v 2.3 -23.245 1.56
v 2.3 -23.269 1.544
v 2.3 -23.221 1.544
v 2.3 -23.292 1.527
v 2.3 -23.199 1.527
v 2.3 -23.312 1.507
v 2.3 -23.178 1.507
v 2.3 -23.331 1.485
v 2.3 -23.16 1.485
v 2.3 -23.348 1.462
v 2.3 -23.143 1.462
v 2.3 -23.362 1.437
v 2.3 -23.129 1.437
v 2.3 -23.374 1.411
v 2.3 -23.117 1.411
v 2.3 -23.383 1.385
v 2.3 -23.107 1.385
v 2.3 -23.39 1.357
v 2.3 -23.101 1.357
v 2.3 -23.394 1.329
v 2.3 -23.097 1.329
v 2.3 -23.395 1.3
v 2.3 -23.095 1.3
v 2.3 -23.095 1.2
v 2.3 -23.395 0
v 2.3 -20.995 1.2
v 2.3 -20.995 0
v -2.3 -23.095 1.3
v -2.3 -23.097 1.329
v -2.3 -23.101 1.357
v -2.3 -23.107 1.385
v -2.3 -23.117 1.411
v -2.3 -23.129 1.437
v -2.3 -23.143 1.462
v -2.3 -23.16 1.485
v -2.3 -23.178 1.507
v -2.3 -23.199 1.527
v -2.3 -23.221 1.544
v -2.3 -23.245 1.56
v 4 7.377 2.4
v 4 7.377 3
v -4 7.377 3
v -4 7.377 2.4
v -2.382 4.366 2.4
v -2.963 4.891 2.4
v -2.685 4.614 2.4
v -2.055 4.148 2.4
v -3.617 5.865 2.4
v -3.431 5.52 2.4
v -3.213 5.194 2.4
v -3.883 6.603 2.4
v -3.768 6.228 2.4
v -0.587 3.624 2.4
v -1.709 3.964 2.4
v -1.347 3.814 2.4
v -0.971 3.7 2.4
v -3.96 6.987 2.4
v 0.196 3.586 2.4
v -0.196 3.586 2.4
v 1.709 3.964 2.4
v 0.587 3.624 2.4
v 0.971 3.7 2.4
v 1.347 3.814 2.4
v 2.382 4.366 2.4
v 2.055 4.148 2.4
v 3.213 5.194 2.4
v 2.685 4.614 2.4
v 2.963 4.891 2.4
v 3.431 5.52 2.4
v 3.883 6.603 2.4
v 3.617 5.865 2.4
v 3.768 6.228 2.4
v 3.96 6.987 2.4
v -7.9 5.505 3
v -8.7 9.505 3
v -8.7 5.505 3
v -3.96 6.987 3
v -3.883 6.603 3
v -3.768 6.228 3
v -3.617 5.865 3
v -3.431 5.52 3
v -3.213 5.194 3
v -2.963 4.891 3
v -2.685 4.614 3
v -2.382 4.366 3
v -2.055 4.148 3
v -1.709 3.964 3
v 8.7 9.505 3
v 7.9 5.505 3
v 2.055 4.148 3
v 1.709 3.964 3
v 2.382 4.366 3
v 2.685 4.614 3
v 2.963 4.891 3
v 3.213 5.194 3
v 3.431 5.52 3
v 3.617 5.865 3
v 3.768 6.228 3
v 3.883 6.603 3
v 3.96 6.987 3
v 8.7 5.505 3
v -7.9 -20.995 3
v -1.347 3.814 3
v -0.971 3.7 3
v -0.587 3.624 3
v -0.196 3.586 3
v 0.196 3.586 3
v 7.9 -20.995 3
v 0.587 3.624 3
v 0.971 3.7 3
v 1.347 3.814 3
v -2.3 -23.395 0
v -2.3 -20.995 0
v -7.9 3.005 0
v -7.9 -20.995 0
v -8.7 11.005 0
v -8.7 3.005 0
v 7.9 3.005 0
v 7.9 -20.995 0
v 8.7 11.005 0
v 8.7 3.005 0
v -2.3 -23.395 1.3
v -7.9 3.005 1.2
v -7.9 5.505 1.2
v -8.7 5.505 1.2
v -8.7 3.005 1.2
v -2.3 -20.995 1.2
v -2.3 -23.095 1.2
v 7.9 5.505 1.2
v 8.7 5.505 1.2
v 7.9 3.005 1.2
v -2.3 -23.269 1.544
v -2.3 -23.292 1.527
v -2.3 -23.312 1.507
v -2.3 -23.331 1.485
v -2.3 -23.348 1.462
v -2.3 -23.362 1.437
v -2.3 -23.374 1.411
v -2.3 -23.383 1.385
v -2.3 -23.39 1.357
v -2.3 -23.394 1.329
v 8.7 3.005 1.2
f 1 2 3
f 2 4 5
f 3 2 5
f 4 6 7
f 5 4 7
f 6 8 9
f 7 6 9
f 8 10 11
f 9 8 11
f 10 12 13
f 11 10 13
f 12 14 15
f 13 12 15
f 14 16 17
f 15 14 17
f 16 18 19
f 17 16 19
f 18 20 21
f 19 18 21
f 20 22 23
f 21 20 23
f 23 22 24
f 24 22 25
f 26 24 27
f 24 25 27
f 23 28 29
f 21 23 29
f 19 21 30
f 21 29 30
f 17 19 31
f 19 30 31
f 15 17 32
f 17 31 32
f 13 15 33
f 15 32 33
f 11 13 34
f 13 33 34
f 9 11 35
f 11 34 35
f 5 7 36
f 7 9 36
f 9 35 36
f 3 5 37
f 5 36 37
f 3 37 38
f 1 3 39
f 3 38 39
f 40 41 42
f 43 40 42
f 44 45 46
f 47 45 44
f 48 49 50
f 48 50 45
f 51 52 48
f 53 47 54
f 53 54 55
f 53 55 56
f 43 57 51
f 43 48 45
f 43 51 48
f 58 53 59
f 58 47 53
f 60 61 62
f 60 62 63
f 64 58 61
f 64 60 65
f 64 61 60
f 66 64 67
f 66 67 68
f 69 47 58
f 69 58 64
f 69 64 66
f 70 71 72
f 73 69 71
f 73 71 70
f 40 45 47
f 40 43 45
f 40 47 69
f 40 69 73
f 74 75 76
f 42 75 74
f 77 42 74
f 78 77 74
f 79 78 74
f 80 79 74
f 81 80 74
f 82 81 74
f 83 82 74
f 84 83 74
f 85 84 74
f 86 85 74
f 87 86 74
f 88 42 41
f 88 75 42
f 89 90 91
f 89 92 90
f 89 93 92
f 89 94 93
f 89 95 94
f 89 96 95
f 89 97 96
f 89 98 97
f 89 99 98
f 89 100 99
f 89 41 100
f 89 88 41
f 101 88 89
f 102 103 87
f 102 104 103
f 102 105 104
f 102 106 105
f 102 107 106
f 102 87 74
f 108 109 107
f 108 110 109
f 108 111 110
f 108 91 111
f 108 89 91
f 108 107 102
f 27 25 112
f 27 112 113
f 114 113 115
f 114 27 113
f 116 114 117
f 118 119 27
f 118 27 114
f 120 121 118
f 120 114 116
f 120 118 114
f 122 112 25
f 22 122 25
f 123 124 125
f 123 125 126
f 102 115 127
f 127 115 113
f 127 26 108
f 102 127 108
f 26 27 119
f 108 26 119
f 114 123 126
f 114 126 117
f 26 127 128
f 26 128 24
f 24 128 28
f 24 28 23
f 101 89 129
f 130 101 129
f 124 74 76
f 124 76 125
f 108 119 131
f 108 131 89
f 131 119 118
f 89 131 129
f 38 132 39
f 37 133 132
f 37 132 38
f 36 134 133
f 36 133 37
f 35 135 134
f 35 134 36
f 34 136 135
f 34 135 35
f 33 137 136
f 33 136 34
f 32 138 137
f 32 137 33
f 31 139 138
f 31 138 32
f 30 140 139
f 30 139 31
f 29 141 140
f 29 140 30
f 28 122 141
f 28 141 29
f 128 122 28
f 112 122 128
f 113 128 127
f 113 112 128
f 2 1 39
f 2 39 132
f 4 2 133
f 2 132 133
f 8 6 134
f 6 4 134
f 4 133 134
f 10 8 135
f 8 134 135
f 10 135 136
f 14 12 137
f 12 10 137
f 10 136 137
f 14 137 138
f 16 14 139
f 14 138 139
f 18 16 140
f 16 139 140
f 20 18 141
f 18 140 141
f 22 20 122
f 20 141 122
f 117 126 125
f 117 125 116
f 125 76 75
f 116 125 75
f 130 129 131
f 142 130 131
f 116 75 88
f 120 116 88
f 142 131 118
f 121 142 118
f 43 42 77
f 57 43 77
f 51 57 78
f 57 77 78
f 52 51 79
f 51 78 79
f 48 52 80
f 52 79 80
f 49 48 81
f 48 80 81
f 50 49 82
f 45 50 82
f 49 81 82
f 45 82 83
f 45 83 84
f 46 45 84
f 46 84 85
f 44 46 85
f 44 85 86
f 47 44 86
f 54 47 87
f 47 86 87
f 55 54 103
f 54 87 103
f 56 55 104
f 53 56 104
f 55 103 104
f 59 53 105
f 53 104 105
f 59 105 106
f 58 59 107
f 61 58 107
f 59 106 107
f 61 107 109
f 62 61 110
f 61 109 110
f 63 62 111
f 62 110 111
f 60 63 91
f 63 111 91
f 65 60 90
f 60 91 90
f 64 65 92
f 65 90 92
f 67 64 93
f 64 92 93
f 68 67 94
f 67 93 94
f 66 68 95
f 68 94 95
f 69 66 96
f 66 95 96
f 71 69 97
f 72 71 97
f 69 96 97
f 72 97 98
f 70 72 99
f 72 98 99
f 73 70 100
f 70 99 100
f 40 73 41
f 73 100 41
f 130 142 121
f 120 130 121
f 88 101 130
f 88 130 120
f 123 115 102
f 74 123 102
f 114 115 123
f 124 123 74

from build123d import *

# Parameters (mm, degrees)
F0_W         = 15.8
F0_H         = 32
F1_DEPTH     = 3
F3_DEPTH     = 0.8
F5_W         = 4.6
F5_H         = 1.2
F6_DEPTH     = 2.4
F8_DEPTH     = 0.6
F9_W         = 4.6
F9_H         = 0.3
F10_DEPTH    = 0.4
F11_T1_DEPTH = 6.1
F12_SIZE2    = 1.49999
F12_SIZE     = 2.99999


# Not quite as in the source:
# - a fillet or chamfer that OpenCascade refuses, or shapes differently, is made with other operations: its cross-section is extruded or revolved along the edge and cut away or added
# - a fillet or chamfer is up to 0.001 mm smaller than in the source, because OpenCascade refuses the exact size


with BuildPart() as f1:
    # F0 (on Top) → F1 (new body)
    with BuildSketch(Plane.XY):
        with Locations((0, -4.9953348935)):
            Rectangle(F0_W, F0_H)
    extrude(amount=F1_DEPTH)

    # F2 (on face) → F3 (join)
    with BuildSketch(Plane.YZ.offset(7.9)):
        Polygon((11.0046651065, 0), (11.0046651065, 3), (5.5046651065, 3), (5.5046651065, 1.2), (3.0046651065, 1.2), (3.0046651065, 0), align=None)
    extrude(amount=F3_DEPTH)

    # F4: F1 across plane


with BuildPart() as f1_1:
    add(f1.part)
    add(f1.part.mirror(Plane.YZ))

    # F5 (on face) → F6 (join)
    with BuildSketch(Plane.XZ.offset(20.9953348935)):
        with Locations((0, 0.6)):
            Rectangle(F5_W, F5_H)
    extrude(amount=F6_DEPTH)

    # F7 (on face) → F8 (cut)
    with BuildSketch(Plane.XY.offset(3)):
        with BuildLine():
            Line((4, 7.3774643242), (-4, 7.3774643242))
            ThreePointArc((-4, 7.3774643242), (0, 3.5808500116), (4, 7.3774643242))
        make_face()
    extrude(amount=-F8_DEPTH, mode=Mode.SUBTRACT)

    # F9 (on face) → F10 (join)
    with BuildSketch(Plane.XY.offset(1.2)):
        with Locations((0, -23.2453348935)):
            Rectangle(F9_W, F9_H)
    extrude(amount=F10_DEPTH)

    # F11: fillet of radius 0.3 on 2 edges, made by hand

    # F11_s2 → F11_t1 (cut)
    with BuildSketch(Plane.YZ.offset(-3.05)):
        with BuildLine():
            ThreePointArc((-23.0953348935, 1.6), (-23.3074669278, 1.5121320344), (-23.3953348935, 1.3))
            Line((-23.3953348935, 1.3), (-23.3953348935, 1.6))
            Line((-23.3953348935, 1.6), (-23.0953348935, 1.6))
        make_face()
        with BuildLine():
            ThreePointArc((-23.0953348935, 1.3), (-23.1832028591, 1.5121320344), (-23.3953348935, 1.6))
            Line((-23.3953348935, 1.6), (-23.0953348935, 1.6))
            Line((-23.0953348935, 1.6), (-23.0953348935, 1.3))
        make_face()
    extrude(amount=F11_T1_DEPTH, mode=Mode.SUBTRACT)

    # F12 (size 3 and 1.5 in the source; OpenCascade refuses exactly that, so slightly less here)
    f12_edges = [f1_1.edges().sort_by_distance(p)[0] for p in [
        (0, 11.004665, 3),
    ]]
    chamfer(f12_edges, length=F12_SIZE, length2=F12_SIZE2)


solid = f1_1.part
